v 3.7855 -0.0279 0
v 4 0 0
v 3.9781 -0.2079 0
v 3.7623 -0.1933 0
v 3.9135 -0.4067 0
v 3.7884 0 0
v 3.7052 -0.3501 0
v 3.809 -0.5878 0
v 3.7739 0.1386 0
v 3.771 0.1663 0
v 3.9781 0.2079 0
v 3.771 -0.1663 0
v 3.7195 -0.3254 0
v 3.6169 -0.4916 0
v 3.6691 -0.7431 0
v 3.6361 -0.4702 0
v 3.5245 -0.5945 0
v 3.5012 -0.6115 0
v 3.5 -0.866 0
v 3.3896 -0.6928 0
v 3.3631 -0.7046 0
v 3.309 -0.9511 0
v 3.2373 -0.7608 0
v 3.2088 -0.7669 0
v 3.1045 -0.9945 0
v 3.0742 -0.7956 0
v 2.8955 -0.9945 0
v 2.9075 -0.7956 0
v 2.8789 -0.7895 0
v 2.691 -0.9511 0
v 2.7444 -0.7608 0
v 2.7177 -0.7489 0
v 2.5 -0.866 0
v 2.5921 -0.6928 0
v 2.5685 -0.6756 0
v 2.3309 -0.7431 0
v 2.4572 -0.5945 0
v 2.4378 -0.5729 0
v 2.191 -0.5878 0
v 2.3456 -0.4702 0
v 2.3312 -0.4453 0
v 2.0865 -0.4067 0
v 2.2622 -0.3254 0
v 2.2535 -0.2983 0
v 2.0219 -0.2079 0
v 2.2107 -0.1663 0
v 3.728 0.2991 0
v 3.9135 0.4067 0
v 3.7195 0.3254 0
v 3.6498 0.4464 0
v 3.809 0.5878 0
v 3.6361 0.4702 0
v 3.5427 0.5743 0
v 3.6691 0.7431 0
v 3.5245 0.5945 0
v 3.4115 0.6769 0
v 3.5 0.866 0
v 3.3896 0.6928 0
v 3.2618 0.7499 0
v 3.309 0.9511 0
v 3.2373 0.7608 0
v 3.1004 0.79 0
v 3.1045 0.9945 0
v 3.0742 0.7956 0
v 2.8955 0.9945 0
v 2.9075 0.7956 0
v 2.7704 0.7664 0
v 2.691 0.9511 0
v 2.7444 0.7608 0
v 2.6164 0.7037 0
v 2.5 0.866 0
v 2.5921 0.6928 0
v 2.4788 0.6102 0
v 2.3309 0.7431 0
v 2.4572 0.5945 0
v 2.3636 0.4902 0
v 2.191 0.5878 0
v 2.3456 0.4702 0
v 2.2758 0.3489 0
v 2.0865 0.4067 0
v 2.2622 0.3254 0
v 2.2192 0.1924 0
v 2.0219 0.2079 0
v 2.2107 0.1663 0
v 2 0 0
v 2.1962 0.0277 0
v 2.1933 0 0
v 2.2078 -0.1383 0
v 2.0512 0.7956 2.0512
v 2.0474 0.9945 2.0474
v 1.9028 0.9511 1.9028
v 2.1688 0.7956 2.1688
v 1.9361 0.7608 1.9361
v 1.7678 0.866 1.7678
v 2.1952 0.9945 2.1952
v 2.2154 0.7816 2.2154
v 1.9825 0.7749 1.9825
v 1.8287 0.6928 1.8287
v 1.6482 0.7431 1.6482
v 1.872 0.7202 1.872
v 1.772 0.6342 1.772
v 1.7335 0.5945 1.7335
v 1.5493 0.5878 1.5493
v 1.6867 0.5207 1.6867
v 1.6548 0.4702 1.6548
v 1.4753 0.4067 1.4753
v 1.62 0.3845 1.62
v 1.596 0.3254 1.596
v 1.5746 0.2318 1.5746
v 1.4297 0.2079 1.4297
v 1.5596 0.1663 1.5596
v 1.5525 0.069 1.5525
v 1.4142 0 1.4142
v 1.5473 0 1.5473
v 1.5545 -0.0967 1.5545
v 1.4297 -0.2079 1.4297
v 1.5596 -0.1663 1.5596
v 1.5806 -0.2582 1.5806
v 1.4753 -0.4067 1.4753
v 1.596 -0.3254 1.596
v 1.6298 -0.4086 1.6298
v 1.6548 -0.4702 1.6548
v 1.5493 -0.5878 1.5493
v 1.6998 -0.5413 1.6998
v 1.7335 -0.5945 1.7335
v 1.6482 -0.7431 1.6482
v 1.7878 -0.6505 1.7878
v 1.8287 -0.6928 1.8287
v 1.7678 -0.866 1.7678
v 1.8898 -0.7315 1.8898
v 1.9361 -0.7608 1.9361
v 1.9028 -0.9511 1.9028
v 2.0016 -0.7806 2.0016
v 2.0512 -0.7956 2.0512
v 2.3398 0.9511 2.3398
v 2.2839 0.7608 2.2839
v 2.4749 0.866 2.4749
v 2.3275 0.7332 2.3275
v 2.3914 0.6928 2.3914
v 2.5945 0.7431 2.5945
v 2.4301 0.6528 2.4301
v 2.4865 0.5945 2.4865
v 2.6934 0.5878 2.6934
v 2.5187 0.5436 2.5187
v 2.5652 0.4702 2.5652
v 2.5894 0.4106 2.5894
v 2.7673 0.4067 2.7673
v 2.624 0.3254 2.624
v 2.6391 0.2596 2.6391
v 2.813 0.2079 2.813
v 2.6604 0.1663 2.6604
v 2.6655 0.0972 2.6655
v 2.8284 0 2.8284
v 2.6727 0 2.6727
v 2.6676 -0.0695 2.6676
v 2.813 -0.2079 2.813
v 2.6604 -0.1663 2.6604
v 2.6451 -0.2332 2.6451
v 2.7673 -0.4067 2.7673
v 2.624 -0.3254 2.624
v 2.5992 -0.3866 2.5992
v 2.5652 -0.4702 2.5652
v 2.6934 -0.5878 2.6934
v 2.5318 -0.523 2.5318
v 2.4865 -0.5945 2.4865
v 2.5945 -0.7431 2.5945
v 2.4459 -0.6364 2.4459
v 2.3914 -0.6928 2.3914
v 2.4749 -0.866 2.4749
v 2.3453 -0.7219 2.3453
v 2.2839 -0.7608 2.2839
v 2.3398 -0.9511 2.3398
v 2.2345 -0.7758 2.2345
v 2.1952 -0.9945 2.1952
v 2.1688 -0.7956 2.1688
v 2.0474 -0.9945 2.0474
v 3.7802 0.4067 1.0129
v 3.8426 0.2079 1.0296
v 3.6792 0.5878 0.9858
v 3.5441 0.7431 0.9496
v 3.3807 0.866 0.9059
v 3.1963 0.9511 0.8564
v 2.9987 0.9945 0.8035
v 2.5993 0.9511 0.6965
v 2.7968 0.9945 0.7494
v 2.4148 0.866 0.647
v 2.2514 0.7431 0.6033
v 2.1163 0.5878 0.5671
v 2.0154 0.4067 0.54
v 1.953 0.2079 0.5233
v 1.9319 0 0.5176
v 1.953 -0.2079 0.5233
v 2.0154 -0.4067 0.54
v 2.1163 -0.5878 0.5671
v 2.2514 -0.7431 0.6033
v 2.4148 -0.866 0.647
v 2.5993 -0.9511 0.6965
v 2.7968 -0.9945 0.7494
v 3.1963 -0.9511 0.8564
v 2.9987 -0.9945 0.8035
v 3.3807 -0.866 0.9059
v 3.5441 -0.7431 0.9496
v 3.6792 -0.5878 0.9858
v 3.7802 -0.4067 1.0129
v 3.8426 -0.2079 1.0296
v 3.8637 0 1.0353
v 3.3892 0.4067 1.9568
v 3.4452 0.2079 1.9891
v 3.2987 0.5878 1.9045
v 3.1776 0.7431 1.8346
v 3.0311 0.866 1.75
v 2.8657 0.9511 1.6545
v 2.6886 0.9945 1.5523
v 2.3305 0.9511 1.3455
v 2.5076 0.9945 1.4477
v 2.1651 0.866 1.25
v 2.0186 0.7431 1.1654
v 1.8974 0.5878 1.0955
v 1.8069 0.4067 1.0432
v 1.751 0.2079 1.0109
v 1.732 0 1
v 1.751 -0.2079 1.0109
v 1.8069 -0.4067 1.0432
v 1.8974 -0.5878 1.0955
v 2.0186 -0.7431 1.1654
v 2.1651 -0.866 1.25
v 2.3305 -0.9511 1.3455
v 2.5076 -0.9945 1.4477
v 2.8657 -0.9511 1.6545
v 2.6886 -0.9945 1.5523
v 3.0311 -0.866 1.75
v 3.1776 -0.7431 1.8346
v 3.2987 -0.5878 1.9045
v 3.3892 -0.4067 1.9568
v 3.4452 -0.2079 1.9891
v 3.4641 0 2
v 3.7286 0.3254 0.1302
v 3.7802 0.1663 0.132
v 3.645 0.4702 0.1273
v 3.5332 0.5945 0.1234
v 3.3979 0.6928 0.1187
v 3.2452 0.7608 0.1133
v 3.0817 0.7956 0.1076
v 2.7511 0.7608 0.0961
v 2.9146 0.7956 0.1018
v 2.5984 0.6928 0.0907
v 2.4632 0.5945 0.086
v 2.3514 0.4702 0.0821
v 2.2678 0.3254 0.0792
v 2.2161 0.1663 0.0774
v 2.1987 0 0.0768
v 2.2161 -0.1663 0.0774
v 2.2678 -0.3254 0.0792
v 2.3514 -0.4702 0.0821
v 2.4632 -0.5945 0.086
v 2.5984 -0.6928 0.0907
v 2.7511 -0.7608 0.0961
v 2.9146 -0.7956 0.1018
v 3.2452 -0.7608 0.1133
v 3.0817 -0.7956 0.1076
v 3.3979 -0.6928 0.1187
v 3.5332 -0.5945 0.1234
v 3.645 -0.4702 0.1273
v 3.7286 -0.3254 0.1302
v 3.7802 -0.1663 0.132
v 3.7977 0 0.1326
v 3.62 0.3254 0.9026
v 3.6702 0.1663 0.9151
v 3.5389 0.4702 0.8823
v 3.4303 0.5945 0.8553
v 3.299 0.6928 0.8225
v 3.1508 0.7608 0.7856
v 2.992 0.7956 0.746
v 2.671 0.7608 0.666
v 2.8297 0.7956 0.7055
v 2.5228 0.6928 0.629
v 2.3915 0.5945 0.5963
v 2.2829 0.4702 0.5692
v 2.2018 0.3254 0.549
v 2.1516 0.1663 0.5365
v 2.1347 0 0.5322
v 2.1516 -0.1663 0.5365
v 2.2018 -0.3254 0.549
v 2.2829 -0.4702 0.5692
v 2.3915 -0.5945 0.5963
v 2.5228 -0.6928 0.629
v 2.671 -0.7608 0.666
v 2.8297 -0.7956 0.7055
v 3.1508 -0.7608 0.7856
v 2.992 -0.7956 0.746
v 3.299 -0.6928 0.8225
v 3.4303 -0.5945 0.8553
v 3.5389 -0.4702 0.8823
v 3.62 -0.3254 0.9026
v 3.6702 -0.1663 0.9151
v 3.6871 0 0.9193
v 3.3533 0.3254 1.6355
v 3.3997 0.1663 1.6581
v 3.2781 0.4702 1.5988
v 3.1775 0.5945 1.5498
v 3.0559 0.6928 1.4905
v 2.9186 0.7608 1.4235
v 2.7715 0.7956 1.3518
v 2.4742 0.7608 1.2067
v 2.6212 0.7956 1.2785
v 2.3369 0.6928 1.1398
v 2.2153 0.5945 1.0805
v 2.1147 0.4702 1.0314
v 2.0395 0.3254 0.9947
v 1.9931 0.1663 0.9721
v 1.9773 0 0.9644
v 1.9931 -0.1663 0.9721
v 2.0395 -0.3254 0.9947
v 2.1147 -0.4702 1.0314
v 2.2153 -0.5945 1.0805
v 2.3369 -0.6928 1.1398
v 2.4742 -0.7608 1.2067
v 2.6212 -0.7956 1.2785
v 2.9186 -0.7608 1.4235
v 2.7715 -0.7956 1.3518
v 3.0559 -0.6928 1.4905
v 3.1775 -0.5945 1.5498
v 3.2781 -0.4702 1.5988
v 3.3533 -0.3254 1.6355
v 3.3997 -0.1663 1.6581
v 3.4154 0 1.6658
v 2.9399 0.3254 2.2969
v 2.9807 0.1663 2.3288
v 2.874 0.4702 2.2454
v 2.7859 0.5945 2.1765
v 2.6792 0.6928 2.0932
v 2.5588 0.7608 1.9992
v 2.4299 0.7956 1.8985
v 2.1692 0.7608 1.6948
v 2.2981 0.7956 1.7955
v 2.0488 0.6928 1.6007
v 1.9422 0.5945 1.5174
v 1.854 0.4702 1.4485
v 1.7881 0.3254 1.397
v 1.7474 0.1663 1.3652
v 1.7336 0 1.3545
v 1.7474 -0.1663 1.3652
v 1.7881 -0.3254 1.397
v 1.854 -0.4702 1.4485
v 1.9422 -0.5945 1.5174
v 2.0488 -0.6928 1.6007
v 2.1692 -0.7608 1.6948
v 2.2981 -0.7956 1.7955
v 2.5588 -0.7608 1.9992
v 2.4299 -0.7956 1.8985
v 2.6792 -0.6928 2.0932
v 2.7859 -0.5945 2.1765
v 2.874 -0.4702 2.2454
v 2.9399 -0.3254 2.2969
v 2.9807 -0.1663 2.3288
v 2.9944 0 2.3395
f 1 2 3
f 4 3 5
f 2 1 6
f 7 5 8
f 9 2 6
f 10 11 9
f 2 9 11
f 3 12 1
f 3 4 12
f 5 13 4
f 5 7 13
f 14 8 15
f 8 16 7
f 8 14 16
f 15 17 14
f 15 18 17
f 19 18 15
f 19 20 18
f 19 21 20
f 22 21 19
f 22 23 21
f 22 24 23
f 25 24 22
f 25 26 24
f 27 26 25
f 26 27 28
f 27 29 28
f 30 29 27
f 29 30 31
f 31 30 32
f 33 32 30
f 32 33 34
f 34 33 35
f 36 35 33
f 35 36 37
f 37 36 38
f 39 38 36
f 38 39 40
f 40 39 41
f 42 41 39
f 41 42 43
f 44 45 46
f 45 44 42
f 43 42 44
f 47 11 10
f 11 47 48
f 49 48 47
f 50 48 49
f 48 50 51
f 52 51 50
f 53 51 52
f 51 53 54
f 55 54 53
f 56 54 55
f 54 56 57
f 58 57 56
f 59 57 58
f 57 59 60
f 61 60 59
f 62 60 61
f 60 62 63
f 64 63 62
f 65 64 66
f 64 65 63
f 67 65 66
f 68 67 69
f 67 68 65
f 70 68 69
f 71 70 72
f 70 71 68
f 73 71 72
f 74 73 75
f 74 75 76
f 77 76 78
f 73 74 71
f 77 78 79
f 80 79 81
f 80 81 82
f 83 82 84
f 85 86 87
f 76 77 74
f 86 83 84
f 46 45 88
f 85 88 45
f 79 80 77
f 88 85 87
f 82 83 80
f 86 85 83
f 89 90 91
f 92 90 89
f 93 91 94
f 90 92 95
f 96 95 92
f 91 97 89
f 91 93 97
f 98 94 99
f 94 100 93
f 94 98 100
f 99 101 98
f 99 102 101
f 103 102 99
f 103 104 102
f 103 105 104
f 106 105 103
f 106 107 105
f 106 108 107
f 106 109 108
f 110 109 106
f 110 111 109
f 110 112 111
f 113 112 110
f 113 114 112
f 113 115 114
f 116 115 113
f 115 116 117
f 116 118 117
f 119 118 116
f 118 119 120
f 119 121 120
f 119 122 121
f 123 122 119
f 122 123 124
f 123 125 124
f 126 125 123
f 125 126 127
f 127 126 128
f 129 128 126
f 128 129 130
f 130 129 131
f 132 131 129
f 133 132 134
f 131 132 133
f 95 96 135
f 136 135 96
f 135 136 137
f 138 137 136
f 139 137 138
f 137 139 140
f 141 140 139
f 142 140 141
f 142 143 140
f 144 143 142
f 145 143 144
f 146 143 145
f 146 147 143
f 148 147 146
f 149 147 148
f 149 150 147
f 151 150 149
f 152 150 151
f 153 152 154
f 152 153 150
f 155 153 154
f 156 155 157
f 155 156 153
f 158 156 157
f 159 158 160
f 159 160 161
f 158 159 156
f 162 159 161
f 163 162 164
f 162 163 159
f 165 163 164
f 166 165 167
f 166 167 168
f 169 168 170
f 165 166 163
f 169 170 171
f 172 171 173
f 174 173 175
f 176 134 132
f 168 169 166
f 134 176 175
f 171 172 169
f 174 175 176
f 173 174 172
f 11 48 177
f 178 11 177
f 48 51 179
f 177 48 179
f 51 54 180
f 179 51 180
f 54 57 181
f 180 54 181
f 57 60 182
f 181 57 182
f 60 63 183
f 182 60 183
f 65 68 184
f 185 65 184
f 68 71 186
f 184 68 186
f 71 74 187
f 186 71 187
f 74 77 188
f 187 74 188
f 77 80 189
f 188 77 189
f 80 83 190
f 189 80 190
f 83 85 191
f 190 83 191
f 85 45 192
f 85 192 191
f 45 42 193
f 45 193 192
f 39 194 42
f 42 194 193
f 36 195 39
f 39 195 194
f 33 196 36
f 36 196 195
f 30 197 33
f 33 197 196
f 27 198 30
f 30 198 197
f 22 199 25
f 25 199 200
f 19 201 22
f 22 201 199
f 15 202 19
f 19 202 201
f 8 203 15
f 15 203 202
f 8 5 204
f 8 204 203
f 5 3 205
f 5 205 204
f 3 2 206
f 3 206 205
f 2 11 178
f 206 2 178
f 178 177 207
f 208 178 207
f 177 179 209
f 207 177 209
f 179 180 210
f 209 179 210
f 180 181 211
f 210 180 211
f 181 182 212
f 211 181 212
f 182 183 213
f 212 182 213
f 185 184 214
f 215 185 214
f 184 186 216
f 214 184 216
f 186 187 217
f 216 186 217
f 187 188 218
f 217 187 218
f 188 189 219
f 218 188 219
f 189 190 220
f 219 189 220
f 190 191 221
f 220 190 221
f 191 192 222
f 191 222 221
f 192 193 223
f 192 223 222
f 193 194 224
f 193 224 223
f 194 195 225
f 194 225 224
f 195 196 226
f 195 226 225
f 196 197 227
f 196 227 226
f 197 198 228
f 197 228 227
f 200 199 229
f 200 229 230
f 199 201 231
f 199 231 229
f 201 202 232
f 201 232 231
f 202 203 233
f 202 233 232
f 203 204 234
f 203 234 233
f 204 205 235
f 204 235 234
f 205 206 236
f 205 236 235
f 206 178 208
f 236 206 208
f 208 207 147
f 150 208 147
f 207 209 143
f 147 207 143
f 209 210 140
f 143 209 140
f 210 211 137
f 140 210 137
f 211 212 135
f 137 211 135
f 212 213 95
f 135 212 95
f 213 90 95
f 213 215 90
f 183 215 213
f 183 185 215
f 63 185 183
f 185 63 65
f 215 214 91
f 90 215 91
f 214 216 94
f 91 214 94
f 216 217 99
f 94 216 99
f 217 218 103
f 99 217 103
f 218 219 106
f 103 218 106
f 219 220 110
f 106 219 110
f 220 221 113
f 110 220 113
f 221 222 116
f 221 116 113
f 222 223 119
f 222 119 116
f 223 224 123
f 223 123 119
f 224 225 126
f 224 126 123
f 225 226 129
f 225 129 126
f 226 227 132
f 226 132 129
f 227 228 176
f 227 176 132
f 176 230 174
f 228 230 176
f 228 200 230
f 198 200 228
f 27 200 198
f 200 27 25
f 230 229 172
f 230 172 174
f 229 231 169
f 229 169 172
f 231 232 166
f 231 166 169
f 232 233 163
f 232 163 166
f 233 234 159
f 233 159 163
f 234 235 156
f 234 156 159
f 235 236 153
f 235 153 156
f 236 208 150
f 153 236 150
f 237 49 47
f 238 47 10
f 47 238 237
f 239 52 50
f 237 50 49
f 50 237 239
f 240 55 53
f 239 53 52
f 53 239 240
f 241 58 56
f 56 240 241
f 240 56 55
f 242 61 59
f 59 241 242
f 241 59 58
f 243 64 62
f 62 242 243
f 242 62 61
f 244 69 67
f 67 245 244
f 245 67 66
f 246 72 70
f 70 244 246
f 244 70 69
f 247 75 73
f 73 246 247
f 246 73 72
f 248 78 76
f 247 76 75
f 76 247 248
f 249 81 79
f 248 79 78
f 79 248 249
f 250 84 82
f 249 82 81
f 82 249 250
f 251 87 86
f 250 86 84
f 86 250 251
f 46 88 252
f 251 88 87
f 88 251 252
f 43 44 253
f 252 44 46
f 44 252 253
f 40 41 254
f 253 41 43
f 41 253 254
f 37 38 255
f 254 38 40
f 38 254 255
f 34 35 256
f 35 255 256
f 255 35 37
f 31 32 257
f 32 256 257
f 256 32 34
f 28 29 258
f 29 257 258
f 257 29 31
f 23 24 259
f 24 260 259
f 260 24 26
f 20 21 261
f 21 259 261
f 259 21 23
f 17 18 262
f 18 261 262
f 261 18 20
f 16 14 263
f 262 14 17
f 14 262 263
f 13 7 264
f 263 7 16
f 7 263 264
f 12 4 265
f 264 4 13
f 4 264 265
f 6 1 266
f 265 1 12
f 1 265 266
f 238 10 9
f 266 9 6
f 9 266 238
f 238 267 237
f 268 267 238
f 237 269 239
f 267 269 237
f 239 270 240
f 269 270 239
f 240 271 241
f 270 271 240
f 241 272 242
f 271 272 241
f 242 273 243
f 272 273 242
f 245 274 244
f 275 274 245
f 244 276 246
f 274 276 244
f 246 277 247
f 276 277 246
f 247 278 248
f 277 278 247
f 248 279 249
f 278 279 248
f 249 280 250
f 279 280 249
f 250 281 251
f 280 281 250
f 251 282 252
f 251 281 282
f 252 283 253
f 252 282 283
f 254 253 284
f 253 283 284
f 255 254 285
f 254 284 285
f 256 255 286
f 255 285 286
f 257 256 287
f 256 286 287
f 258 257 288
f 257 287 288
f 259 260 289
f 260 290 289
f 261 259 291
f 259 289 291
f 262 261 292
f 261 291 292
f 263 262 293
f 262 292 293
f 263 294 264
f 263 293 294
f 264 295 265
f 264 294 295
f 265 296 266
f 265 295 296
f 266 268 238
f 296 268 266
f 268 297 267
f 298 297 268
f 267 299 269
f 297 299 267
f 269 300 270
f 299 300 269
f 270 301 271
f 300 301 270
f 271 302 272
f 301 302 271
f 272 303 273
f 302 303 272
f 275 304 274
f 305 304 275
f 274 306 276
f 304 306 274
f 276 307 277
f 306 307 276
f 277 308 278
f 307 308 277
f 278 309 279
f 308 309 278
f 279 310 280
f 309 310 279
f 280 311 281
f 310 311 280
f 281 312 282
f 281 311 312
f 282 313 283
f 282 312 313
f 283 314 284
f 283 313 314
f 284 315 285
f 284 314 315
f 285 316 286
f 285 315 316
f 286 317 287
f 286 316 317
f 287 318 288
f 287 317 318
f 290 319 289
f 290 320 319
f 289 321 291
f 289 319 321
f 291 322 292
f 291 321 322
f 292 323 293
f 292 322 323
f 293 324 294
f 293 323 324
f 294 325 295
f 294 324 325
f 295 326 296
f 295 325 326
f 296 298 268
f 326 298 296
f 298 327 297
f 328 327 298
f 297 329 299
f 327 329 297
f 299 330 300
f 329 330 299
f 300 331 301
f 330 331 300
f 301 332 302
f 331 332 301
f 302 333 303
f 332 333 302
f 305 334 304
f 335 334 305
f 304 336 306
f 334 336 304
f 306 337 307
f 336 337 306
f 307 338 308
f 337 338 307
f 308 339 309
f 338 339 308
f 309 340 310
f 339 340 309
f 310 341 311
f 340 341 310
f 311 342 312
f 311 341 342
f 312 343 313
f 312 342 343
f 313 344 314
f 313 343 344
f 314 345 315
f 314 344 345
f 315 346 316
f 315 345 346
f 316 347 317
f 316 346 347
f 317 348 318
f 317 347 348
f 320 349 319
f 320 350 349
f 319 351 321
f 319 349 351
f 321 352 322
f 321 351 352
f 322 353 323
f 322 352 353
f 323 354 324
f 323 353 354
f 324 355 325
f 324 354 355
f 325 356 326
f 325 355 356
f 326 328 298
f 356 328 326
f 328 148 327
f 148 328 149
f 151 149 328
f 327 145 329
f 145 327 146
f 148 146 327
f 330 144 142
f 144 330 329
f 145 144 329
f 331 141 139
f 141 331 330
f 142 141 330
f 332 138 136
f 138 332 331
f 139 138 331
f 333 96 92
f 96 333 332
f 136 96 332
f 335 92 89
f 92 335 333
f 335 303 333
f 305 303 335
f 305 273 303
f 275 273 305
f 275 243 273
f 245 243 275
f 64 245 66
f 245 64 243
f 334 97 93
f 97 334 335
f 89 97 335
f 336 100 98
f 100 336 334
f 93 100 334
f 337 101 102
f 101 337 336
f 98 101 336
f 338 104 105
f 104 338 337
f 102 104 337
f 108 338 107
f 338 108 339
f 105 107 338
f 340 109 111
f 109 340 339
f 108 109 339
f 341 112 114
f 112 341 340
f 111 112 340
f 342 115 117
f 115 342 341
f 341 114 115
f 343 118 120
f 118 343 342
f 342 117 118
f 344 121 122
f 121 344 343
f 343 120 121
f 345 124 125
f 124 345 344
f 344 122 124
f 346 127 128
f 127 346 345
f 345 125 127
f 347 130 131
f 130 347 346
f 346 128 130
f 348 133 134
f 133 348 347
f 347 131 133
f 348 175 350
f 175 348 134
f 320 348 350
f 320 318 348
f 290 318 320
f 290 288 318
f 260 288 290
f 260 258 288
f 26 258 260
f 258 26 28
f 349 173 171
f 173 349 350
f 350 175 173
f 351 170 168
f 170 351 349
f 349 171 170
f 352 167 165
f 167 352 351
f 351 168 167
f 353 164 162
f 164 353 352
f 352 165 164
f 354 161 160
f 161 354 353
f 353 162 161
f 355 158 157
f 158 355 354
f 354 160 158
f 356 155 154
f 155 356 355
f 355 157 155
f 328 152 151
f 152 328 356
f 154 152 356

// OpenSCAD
// Nicolì Angelo 2023 - THIS CODE IS LICENSED AS GPL-2.0
module Pipe_45(){

    module pipe(raggio,angolo){
        color("#a8b0b2")
        rotate([90,0,0])
        rotate_extrude(angle=angolo, $fn = $preview? 90: 30) 
        translate([3, 0, 0])
        circle(r = raggio, $fn = $preview? 90: 30);
    }

    difference(){
       translate([0,0])
       pipe(1,45);
       
       rotate([0,10,0])
       translate([0,0])
       pipe(0.8,60);
     }

    module repeat(){
        difference(){
         for (i =[-1:1]){
             translate([0,5*i,0])
             ring(1,90);
         }

         for (i =[-1:1]){
            rotate([0,10,0])
             translate([0,5*i,0])
             ring(0.8,110);
             }
         
        }
    }

}

Pipe_45();

// Written by Nicolì Angelo (Gengio) 2024: 
// MIT License

//Permission is hereby granted, free of charge, to any person obtaining a copy of this software and associated documentation files (the "Software"), to deal in the Software without restriction, including without limitation the rights to use, copy, modify, merge, publish, distribute, sublicense, and/or sell copies of the Software, and to permit persons to whom the Software is furnished to do so, subject to the following conditions:

//The above copyright notice and this permission notice shall be included in all copies or substantial portions of the Software.

//THE SOFTWARE IS PROVIDED "AS IS", WITHOUT WARRANTY OF ANY KIND, EXPRESS OR IMPLIED, INCLUDING BUT NOT LIMITED TO THE WARRANTIES OF MERCHANTABILITY, FITNESS FOR A PARTICULAR PURPOSE AND NONINFRINGEMENT. IN NO EVENT SHALL THE AUTHORS OR COPYRIGHT HOLDERS BE LIABLE FOR ANY CLAIM, DAMAGES OR OTHER LIABILITY, WHETHER IN AN ACTION OF CONTRACT, TORT OR OTHERWISE, ARISING FROM, OUT OF OR IN CONNECTION WITH THE SOFTWARE OR THE USE OR OTHER DEALINGS IN THE SOFTWARE.
